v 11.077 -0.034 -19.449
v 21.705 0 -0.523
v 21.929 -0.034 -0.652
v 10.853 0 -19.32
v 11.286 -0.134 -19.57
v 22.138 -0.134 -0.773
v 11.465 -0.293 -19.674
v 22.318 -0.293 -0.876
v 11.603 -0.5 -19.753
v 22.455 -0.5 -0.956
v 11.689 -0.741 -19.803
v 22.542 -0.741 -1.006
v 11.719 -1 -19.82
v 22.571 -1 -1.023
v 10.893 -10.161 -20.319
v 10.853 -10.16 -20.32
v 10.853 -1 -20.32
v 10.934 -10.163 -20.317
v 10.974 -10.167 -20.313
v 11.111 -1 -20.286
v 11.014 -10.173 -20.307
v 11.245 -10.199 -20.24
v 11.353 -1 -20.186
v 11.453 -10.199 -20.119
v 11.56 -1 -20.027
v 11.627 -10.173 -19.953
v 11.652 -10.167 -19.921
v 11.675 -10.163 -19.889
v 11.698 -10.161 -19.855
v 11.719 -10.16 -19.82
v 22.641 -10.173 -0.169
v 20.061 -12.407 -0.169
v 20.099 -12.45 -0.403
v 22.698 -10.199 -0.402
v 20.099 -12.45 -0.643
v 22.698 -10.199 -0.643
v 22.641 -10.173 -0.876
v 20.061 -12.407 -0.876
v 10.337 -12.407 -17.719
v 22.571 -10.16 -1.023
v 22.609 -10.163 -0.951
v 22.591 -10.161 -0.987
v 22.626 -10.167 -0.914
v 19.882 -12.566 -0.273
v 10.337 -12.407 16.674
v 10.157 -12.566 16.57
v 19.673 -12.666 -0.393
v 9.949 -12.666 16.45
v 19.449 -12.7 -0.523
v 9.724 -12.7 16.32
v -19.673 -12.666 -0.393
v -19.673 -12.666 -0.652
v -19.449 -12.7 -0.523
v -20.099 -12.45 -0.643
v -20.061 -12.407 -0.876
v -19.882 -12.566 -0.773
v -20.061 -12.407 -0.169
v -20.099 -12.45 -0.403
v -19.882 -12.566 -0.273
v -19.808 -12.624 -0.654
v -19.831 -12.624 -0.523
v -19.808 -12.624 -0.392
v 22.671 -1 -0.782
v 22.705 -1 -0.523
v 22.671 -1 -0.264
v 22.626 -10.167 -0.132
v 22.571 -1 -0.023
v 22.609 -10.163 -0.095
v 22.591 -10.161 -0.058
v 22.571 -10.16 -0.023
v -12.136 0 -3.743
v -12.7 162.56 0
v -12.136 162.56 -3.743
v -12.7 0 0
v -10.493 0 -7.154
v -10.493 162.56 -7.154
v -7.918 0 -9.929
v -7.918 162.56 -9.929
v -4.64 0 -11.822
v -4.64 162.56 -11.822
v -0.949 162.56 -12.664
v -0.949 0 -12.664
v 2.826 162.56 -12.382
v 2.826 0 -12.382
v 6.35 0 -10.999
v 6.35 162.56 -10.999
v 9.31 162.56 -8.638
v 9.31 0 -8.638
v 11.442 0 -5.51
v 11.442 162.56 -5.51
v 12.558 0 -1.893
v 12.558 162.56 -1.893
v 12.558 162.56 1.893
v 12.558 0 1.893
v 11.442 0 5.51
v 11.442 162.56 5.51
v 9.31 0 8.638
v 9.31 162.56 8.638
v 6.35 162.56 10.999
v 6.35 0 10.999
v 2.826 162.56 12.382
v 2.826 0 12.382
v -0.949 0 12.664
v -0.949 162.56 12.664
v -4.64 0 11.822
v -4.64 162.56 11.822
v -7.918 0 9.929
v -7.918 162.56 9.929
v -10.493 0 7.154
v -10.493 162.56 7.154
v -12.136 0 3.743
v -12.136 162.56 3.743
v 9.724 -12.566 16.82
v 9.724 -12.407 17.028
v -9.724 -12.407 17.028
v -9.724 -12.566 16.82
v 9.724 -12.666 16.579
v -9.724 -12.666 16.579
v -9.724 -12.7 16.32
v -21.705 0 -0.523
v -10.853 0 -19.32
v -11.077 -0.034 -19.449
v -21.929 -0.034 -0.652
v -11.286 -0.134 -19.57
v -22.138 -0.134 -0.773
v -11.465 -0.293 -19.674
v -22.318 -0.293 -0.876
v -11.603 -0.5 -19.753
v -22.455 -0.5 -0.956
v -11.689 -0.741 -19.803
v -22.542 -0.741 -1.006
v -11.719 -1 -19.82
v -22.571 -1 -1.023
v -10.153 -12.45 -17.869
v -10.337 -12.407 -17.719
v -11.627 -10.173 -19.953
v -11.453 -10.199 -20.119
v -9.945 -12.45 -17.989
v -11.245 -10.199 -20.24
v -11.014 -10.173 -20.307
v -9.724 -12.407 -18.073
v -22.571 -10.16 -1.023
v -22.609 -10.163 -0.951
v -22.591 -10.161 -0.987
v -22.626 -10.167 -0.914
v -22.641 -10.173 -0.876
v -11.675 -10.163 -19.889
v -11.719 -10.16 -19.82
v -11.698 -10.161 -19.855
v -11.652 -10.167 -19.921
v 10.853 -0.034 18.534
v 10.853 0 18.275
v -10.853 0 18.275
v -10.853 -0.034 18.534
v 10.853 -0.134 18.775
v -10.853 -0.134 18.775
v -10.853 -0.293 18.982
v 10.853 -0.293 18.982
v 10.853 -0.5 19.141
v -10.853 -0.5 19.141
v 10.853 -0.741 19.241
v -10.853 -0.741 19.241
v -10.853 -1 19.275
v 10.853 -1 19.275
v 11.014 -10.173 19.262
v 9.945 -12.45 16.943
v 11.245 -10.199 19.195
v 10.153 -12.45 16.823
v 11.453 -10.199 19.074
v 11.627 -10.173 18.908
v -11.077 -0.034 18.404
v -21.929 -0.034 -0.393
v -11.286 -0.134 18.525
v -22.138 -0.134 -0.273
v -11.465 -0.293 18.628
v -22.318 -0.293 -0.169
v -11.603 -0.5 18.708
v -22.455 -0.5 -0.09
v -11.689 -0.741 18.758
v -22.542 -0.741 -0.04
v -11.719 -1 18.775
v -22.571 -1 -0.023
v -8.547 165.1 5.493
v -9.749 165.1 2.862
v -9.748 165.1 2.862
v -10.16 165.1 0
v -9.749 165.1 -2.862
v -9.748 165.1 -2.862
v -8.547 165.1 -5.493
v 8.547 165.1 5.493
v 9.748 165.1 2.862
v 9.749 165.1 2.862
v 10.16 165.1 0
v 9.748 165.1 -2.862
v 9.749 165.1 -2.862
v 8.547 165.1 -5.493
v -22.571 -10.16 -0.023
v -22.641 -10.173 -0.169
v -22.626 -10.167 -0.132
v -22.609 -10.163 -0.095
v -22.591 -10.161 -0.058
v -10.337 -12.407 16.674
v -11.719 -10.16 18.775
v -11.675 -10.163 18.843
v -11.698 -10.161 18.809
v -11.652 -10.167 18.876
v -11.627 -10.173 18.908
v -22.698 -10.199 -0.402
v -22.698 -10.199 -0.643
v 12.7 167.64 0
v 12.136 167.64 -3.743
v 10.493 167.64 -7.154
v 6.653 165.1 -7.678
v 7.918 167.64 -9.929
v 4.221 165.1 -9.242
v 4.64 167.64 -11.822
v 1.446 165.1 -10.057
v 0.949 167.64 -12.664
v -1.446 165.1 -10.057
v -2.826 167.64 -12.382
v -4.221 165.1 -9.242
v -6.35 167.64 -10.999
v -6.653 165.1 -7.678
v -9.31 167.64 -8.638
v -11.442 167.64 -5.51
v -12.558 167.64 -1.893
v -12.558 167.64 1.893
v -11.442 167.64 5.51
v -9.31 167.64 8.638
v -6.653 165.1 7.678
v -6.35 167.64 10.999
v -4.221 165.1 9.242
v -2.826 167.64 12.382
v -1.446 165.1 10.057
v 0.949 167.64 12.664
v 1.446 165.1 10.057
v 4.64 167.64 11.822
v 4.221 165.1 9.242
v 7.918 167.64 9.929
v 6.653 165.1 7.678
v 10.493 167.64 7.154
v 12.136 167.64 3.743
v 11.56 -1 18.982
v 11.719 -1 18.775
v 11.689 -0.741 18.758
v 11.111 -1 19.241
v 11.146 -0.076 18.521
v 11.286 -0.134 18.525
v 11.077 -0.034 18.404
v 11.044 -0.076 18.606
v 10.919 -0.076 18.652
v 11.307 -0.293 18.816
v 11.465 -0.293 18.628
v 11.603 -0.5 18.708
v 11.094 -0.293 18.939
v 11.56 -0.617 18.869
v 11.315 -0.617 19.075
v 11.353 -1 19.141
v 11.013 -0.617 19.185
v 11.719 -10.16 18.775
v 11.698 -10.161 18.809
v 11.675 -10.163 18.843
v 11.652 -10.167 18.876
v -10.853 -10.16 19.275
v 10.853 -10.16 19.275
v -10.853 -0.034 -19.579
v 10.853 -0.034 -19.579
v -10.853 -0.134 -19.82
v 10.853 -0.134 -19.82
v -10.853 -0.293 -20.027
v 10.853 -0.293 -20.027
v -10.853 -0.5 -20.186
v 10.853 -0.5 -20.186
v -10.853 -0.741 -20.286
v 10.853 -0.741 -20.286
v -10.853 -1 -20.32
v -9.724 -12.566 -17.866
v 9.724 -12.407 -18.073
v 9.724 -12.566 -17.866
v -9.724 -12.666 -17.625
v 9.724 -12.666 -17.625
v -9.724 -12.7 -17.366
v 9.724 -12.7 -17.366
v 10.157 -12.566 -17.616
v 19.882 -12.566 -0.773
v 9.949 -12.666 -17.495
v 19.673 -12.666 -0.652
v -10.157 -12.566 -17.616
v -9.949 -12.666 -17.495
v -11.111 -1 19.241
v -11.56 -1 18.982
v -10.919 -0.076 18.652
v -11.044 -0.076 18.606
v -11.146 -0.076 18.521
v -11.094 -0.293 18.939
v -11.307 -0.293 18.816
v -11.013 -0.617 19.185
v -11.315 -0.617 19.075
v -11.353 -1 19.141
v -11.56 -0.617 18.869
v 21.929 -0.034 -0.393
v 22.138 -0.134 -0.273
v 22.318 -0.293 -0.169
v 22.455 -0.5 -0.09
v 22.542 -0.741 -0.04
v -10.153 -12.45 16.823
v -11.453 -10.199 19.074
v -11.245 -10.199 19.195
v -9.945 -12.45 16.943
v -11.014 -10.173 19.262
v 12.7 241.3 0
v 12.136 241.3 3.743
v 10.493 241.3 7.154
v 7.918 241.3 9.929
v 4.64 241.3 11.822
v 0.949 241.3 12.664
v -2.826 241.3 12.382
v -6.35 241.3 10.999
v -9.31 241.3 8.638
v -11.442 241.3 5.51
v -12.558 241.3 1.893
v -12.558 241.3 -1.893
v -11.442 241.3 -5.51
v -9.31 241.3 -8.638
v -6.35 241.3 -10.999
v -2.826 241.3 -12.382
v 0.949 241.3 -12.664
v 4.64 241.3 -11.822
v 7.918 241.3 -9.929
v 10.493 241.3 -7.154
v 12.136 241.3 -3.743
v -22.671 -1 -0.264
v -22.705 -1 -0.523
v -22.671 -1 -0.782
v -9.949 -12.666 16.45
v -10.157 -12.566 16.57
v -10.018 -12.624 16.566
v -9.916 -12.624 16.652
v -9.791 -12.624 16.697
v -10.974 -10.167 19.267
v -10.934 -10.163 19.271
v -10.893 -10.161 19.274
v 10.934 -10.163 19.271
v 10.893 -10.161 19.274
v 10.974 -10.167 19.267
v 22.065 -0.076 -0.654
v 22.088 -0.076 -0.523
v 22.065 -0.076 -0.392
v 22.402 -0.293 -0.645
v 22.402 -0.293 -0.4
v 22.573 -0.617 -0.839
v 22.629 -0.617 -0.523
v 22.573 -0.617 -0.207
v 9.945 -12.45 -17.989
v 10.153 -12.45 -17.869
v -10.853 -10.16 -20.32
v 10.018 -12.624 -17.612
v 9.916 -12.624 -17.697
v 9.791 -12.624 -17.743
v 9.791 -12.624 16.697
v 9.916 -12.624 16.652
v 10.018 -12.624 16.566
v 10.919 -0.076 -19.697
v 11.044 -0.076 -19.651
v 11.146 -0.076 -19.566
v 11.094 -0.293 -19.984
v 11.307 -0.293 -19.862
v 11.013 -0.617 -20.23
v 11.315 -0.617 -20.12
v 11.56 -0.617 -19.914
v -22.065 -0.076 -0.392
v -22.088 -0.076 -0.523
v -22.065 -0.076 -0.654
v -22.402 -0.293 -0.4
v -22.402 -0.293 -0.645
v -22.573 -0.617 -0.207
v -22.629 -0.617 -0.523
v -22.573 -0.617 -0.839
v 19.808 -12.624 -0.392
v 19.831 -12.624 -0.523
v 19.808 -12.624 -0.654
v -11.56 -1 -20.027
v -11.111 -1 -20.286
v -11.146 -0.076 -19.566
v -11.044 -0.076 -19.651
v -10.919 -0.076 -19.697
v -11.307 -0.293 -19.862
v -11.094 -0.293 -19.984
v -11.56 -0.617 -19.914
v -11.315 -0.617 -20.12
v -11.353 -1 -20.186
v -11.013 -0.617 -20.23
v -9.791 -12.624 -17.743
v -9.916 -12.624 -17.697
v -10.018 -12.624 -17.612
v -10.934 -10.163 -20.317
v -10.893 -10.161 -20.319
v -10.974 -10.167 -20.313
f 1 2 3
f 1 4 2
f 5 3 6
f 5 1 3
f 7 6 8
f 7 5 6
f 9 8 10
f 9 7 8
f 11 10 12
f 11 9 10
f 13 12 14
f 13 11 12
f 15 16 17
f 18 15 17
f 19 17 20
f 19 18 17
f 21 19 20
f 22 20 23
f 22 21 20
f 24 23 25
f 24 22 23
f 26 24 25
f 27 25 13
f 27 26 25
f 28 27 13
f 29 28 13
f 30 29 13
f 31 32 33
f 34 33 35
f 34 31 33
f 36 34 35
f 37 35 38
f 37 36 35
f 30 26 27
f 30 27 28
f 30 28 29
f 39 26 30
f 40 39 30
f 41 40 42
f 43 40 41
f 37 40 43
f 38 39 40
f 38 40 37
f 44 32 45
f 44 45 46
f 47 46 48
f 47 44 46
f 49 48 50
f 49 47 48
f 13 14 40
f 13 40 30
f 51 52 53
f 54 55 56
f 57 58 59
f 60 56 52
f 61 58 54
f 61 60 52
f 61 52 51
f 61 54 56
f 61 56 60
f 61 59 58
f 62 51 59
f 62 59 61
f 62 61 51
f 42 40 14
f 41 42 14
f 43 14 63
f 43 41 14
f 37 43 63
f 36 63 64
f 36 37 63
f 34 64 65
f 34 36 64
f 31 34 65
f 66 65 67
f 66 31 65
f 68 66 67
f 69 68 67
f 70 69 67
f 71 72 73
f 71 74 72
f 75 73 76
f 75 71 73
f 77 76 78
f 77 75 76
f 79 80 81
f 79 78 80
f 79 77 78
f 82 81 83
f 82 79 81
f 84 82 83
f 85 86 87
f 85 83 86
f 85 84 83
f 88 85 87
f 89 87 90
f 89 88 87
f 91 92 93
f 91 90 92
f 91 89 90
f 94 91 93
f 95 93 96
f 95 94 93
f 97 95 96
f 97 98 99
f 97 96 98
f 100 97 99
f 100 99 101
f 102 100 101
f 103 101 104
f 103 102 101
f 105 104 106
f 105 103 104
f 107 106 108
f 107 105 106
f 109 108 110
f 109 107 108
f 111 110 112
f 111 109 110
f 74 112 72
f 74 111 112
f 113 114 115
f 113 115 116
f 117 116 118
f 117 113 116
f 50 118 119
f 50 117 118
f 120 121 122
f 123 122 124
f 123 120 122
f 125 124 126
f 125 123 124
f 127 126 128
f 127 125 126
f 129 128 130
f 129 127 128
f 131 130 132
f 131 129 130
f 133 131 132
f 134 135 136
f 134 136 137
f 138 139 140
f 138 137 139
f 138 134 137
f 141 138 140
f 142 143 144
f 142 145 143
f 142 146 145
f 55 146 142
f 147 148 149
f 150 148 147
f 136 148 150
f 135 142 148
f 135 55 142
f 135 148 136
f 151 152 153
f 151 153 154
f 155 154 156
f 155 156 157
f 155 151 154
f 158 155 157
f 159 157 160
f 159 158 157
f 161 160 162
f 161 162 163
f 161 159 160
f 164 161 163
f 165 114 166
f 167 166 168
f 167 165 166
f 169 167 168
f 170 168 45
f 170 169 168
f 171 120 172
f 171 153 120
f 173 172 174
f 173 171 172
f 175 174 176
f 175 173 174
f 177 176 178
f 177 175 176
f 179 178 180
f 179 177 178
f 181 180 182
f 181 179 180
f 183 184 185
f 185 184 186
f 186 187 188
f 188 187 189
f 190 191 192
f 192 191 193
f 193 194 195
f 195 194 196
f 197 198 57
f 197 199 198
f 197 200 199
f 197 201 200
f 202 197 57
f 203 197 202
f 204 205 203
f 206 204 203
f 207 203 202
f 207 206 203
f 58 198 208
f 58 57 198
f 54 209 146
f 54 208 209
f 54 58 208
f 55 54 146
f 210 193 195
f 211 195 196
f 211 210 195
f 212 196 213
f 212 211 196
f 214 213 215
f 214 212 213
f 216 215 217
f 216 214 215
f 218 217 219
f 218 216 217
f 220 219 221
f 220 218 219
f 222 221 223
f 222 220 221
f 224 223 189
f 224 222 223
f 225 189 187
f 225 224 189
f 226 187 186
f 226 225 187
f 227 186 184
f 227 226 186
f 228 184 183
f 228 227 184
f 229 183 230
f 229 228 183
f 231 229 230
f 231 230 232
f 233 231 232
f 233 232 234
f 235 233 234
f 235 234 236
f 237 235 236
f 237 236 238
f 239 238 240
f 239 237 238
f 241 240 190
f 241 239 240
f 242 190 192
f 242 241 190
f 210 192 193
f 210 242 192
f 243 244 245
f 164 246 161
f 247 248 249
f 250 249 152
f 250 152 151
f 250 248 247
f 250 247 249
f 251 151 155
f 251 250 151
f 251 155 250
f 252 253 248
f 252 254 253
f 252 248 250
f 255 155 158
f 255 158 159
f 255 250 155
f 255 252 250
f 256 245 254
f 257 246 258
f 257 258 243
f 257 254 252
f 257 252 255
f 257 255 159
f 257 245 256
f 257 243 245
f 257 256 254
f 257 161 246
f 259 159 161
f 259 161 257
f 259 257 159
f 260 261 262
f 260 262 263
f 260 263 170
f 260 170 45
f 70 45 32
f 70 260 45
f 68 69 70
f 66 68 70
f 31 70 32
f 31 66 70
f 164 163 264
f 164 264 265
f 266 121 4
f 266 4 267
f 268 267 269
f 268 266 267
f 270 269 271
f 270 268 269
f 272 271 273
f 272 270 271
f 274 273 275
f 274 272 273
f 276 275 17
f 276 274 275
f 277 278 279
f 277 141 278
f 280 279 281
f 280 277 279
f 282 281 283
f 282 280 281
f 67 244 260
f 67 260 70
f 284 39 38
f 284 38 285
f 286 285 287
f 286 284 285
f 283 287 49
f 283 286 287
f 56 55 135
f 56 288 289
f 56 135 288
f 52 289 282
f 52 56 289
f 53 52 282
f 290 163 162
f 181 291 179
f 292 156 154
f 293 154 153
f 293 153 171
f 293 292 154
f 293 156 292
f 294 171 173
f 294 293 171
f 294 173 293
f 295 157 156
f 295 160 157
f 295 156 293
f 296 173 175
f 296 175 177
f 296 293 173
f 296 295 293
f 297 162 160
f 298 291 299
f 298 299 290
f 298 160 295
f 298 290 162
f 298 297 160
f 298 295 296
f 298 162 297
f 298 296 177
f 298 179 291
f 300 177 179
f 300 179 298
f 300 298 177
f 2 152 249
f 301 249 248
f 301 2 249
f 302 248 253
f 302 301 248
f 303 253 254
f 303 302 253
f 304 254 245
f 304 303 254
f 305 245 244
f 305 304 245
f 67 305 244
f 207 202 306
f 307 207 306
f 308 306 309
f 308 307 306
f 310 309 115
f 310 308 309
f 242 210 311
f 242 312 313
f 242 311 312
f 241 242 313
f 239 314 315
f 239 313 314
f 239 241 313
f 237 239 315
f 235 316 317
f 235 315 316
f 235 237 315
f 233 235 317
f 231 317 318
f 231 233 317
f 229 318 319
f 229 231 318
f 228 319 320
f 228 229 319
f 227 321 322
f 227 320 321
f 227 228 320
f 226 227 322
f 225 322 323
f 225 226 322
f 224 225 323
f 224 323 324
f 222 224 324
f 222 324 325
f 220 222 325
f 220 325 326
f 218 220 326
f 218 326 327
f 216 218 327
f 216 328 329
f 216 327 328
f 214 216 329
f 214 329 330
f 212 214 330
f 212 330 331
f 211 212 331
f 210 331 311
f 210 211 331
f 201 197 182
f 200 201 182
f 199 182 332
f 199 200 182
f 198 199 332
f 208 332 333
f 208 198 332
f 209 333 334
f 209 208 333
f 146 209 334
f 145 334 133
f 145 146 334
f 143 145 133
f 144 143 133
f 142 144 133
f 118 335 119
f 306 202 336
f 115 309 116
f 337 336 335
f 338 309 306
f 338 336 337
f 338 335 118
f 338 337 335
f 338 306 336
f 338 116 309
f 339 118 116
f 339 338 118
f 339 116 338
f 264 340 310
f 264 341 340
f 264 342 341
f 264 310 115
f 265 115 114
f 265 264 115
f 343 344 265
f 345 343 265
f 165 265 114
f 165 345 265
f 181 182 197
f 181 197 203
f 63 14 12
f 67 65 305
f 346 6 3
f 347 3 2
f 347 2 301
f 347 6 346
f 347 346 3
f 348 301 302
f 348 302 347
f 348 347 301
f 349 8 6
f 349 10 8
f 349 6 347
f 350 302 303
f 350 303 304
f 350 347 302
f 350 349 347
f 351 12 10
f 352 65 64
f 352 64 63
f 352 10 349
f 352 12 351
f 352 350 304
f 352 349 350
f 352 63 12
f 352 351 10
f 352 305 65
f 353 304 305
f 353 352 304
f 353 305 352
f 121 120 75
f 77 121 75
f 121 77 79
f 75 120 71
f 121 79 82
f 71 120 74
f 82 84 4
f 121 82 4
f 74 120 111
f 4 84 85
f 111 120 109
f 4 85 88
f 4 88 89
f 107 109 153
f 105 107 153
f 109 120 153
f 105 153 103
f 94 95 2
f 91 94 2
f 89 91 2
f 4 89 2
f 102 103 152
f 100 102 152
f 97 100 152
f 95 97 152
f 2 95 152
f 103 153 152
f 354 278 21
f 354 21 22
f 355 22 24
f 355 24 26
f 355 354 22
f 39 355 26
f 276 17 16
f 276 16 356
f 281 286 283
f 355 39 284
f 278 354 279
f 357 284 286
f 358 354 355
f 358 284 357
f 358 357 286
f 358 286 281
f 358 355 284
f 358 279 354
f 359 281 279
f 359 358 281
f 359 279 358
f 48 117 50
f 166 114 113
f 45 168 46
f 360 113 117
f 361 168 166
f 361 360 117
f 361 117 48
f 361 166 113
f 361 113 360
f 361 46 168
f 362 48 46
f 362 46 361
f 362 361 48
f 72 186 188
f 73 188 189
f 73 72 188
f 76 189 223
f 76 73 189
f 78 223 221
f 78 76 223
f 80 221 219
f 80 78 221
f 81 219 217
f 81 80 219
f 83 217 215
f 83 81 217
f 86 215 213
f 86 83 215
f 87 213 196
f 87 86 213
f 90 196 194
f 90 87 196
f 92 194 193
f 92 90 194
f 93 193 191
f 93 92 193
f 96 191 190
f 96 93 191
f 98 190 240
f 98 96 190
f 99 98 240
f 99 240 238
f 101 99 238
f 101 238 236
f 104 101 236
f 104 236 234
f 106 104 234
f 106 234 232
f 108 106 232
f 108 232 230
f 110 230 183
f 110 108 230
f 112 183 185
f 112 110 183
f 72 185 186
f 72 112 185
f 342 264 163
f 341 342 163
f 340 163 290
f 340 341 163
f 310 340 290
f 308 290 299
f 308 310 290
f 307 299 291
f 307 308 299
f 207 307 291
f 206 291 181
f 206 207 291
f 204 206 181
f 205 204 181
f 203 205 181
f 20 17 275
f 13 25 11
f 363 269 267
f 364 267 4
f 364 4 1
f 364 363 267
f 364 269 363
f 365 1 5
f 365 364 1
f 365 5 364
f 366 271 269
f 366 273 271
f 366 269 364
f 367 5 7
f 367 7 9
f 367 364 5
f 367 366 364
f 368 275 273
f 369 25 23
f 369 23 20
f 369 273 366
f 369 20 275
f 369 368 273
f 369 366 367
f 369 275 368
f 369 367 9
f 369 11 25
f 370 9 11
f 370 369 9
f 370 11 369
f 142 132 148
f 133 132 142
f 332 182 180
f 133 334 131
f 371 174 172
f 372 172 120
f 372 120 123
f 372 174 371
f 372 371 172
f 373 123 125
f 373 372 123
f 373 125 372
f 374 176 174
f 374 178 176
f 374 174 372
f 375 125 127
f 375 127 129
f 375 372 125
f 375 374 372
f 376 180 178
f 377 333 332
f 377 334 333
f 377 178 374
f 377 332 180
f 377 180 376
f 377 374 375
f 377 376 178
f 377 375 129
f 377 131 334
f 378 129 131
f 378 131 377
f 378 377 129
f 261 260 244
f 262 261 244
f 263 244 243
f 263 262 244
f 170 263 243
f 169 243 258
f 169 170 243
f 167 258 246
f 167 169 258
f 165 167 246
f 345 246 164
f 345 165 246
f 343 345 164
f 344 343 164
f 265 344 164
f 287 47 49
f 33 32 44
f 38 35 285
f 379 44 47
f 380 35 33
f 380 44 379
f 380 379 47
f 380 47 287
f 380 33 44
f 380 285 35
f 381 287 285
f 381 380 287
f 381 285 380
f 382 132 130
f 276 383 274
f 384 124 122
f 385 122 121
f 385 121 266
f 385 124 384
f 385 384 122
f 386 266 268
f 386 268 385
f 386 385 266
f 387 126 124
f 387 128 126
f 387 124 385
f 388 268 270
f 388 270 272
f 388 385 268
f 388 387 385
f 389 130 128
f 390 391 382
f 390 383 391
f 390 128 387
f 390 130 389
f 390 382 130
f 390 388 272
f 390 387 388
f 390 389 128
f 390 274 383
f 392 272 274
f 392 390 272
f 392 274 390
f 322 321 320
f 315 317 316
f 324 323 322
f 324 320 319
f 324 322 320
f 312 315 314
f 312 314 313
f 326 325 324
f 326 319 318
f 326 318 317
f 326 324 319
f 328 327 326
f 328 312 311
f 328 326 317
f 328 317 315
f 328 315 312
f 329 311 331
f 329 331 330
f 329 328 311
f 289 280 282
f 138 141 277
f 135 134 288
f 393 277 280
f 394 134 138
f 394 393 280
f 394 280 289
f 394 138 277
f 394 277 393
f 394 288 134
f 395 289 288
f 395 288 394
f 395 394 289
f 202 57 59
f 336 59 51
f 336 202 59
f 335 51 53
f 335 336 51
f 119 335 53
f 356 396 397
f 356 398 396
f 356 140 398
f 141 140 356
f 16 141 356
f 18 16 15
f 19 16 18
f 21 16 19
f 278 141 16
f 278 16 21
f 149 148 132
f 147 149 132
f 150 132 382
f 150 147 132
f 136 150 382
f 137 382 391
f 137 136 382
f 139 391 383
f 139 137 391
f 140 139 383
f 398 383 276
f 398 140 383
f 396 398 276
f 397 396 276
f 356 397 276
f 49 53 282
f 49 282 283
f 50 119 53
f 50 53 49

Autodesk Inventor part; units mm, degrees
ref_plane "YZ Plane" through (0, 0, 0) normal (1, 0, 0) x (0, 1, 0)
ref_plane "XZ Plane" through (0, 0, 0) normal (0, 1, 0) x (-1, 0, 0)
ref_plane "XY Plane" through (0, 0, 0) normal (0, 0, 1) x (1, 0, 0)
sketch "Sketch1" plane through (0, 0, 0) normal (0, 1, 0) x (-1, 0, 0)
  circle A0 centre (0, 0) radius 12.7
  dimension "d0" = 25.4
extrude "Extrusion1" add sketch "Sketch1" along normal blind 165.1
sketch "Sketch2" plane through (0, 165.1, 0) normal (0, 1, 0) x (1, 0, 0)
  circle A0 centre (0, 0) radius 12.7 projected
chamfer "Chamfer1" distance 2.54 angle 45 1 edges at (12.7, 165.1, 0)
extrude "Extrusion2" add sketch "Sketch2" along normal blind 76.2
thread "Thread2" size "1-8 UNC" class "2A" standard "ANSI Unified Screw Threads" full length
chamfer "Chamfer2" distance 2.54 angle 45 1 edges at (-12.7, 165.1, 0)
sketch "Sketch3" plane through (0, 0, 0) normal (0, -1, 0) x (1, 0, 0)
  line L0 (0, 20.32) -> (0, -20.32) construction
  line L1 (0, -20.32) -> (11.43, -20.32) construction
  line L2 (11.43, -20.32) -> (-11.43, -20.32)
  line L3 (-11.43, -20.32) -> (-22.86, -0.5227)
  line L4 (-22.86, -0.5227) -> (-11.43, 19.2747)
  line L5 (-11.43, 19.2747) -> (11.43, 19.2747)
  line L6 (11.43, 19.2747) -> (22.86, -0.5227)
  line L7 (22.86, -0.5227) -> (11.43, -20.32)
  point P0 (0, 0)
  dimension "d18" = 20.32
  dimension "d19" = 40.64
  dimension "d20" = 11.43
  dimension "d21" = 22.86
  dimension "d22" = 22.86
  dimension "d23" = 120
  dimension "d24" = 22.86
  dimension "d25" = 22.86
  dimension "d26" = 120
extrude "Extrusion3" add sketch "Sketch3" along normal blind 12.7
chamfer "Chamfer3" distance 2.54 angle 45 6 edges at (0, -12.7, -20.32) (-17.145, -12.7, -10.4213) (-17.145, -12.7, 9.376) (0, -12.7, 19.2747) (17.145, -12.7, 9.376) (17.145, -12.7, -10.4213)
fillet "Fillet1" radius 1 12 edges at (-10.6968, -11.43, -19.05) (10.6968, -11.43, -19.05) (21.3935, -11.43, -0.5227) (10.6968, -11.43, 18.0047) (-10.6968, -11.43, 18.0047) (-21.3935, -11.43, -0.5227) (-14.9453, -12.7, -9.1513) (-14.9453, -12.7, 8.106) (0, -12.7, 16.7347) (14.9453, -12.7, 8.106) (14.9453, -12.7, -9.1513) (0, -12.7, -17.78)
fillet "Fillet2" radius 1 12 edges at (11.43, -5.0343, -20.32) (22.86, -5.0343, -0.5227) (11.43, -5.0343, 19.2747) (-11.43, -5.0343, 19.2747) (-22.86, -5.0343, -0.5227) (-11.43, -5.0343, -20.32) (-17.145, 0, 9.376) (-17.145, 0, -10.4213) (0, 0, 19.2747) (17.145, 0, 9.376) (17.145, 0, -10.4213) (0, 0, -20.32)
properties part number "CIM Mount Bolt" material "Aluminum 6061-AHC"
